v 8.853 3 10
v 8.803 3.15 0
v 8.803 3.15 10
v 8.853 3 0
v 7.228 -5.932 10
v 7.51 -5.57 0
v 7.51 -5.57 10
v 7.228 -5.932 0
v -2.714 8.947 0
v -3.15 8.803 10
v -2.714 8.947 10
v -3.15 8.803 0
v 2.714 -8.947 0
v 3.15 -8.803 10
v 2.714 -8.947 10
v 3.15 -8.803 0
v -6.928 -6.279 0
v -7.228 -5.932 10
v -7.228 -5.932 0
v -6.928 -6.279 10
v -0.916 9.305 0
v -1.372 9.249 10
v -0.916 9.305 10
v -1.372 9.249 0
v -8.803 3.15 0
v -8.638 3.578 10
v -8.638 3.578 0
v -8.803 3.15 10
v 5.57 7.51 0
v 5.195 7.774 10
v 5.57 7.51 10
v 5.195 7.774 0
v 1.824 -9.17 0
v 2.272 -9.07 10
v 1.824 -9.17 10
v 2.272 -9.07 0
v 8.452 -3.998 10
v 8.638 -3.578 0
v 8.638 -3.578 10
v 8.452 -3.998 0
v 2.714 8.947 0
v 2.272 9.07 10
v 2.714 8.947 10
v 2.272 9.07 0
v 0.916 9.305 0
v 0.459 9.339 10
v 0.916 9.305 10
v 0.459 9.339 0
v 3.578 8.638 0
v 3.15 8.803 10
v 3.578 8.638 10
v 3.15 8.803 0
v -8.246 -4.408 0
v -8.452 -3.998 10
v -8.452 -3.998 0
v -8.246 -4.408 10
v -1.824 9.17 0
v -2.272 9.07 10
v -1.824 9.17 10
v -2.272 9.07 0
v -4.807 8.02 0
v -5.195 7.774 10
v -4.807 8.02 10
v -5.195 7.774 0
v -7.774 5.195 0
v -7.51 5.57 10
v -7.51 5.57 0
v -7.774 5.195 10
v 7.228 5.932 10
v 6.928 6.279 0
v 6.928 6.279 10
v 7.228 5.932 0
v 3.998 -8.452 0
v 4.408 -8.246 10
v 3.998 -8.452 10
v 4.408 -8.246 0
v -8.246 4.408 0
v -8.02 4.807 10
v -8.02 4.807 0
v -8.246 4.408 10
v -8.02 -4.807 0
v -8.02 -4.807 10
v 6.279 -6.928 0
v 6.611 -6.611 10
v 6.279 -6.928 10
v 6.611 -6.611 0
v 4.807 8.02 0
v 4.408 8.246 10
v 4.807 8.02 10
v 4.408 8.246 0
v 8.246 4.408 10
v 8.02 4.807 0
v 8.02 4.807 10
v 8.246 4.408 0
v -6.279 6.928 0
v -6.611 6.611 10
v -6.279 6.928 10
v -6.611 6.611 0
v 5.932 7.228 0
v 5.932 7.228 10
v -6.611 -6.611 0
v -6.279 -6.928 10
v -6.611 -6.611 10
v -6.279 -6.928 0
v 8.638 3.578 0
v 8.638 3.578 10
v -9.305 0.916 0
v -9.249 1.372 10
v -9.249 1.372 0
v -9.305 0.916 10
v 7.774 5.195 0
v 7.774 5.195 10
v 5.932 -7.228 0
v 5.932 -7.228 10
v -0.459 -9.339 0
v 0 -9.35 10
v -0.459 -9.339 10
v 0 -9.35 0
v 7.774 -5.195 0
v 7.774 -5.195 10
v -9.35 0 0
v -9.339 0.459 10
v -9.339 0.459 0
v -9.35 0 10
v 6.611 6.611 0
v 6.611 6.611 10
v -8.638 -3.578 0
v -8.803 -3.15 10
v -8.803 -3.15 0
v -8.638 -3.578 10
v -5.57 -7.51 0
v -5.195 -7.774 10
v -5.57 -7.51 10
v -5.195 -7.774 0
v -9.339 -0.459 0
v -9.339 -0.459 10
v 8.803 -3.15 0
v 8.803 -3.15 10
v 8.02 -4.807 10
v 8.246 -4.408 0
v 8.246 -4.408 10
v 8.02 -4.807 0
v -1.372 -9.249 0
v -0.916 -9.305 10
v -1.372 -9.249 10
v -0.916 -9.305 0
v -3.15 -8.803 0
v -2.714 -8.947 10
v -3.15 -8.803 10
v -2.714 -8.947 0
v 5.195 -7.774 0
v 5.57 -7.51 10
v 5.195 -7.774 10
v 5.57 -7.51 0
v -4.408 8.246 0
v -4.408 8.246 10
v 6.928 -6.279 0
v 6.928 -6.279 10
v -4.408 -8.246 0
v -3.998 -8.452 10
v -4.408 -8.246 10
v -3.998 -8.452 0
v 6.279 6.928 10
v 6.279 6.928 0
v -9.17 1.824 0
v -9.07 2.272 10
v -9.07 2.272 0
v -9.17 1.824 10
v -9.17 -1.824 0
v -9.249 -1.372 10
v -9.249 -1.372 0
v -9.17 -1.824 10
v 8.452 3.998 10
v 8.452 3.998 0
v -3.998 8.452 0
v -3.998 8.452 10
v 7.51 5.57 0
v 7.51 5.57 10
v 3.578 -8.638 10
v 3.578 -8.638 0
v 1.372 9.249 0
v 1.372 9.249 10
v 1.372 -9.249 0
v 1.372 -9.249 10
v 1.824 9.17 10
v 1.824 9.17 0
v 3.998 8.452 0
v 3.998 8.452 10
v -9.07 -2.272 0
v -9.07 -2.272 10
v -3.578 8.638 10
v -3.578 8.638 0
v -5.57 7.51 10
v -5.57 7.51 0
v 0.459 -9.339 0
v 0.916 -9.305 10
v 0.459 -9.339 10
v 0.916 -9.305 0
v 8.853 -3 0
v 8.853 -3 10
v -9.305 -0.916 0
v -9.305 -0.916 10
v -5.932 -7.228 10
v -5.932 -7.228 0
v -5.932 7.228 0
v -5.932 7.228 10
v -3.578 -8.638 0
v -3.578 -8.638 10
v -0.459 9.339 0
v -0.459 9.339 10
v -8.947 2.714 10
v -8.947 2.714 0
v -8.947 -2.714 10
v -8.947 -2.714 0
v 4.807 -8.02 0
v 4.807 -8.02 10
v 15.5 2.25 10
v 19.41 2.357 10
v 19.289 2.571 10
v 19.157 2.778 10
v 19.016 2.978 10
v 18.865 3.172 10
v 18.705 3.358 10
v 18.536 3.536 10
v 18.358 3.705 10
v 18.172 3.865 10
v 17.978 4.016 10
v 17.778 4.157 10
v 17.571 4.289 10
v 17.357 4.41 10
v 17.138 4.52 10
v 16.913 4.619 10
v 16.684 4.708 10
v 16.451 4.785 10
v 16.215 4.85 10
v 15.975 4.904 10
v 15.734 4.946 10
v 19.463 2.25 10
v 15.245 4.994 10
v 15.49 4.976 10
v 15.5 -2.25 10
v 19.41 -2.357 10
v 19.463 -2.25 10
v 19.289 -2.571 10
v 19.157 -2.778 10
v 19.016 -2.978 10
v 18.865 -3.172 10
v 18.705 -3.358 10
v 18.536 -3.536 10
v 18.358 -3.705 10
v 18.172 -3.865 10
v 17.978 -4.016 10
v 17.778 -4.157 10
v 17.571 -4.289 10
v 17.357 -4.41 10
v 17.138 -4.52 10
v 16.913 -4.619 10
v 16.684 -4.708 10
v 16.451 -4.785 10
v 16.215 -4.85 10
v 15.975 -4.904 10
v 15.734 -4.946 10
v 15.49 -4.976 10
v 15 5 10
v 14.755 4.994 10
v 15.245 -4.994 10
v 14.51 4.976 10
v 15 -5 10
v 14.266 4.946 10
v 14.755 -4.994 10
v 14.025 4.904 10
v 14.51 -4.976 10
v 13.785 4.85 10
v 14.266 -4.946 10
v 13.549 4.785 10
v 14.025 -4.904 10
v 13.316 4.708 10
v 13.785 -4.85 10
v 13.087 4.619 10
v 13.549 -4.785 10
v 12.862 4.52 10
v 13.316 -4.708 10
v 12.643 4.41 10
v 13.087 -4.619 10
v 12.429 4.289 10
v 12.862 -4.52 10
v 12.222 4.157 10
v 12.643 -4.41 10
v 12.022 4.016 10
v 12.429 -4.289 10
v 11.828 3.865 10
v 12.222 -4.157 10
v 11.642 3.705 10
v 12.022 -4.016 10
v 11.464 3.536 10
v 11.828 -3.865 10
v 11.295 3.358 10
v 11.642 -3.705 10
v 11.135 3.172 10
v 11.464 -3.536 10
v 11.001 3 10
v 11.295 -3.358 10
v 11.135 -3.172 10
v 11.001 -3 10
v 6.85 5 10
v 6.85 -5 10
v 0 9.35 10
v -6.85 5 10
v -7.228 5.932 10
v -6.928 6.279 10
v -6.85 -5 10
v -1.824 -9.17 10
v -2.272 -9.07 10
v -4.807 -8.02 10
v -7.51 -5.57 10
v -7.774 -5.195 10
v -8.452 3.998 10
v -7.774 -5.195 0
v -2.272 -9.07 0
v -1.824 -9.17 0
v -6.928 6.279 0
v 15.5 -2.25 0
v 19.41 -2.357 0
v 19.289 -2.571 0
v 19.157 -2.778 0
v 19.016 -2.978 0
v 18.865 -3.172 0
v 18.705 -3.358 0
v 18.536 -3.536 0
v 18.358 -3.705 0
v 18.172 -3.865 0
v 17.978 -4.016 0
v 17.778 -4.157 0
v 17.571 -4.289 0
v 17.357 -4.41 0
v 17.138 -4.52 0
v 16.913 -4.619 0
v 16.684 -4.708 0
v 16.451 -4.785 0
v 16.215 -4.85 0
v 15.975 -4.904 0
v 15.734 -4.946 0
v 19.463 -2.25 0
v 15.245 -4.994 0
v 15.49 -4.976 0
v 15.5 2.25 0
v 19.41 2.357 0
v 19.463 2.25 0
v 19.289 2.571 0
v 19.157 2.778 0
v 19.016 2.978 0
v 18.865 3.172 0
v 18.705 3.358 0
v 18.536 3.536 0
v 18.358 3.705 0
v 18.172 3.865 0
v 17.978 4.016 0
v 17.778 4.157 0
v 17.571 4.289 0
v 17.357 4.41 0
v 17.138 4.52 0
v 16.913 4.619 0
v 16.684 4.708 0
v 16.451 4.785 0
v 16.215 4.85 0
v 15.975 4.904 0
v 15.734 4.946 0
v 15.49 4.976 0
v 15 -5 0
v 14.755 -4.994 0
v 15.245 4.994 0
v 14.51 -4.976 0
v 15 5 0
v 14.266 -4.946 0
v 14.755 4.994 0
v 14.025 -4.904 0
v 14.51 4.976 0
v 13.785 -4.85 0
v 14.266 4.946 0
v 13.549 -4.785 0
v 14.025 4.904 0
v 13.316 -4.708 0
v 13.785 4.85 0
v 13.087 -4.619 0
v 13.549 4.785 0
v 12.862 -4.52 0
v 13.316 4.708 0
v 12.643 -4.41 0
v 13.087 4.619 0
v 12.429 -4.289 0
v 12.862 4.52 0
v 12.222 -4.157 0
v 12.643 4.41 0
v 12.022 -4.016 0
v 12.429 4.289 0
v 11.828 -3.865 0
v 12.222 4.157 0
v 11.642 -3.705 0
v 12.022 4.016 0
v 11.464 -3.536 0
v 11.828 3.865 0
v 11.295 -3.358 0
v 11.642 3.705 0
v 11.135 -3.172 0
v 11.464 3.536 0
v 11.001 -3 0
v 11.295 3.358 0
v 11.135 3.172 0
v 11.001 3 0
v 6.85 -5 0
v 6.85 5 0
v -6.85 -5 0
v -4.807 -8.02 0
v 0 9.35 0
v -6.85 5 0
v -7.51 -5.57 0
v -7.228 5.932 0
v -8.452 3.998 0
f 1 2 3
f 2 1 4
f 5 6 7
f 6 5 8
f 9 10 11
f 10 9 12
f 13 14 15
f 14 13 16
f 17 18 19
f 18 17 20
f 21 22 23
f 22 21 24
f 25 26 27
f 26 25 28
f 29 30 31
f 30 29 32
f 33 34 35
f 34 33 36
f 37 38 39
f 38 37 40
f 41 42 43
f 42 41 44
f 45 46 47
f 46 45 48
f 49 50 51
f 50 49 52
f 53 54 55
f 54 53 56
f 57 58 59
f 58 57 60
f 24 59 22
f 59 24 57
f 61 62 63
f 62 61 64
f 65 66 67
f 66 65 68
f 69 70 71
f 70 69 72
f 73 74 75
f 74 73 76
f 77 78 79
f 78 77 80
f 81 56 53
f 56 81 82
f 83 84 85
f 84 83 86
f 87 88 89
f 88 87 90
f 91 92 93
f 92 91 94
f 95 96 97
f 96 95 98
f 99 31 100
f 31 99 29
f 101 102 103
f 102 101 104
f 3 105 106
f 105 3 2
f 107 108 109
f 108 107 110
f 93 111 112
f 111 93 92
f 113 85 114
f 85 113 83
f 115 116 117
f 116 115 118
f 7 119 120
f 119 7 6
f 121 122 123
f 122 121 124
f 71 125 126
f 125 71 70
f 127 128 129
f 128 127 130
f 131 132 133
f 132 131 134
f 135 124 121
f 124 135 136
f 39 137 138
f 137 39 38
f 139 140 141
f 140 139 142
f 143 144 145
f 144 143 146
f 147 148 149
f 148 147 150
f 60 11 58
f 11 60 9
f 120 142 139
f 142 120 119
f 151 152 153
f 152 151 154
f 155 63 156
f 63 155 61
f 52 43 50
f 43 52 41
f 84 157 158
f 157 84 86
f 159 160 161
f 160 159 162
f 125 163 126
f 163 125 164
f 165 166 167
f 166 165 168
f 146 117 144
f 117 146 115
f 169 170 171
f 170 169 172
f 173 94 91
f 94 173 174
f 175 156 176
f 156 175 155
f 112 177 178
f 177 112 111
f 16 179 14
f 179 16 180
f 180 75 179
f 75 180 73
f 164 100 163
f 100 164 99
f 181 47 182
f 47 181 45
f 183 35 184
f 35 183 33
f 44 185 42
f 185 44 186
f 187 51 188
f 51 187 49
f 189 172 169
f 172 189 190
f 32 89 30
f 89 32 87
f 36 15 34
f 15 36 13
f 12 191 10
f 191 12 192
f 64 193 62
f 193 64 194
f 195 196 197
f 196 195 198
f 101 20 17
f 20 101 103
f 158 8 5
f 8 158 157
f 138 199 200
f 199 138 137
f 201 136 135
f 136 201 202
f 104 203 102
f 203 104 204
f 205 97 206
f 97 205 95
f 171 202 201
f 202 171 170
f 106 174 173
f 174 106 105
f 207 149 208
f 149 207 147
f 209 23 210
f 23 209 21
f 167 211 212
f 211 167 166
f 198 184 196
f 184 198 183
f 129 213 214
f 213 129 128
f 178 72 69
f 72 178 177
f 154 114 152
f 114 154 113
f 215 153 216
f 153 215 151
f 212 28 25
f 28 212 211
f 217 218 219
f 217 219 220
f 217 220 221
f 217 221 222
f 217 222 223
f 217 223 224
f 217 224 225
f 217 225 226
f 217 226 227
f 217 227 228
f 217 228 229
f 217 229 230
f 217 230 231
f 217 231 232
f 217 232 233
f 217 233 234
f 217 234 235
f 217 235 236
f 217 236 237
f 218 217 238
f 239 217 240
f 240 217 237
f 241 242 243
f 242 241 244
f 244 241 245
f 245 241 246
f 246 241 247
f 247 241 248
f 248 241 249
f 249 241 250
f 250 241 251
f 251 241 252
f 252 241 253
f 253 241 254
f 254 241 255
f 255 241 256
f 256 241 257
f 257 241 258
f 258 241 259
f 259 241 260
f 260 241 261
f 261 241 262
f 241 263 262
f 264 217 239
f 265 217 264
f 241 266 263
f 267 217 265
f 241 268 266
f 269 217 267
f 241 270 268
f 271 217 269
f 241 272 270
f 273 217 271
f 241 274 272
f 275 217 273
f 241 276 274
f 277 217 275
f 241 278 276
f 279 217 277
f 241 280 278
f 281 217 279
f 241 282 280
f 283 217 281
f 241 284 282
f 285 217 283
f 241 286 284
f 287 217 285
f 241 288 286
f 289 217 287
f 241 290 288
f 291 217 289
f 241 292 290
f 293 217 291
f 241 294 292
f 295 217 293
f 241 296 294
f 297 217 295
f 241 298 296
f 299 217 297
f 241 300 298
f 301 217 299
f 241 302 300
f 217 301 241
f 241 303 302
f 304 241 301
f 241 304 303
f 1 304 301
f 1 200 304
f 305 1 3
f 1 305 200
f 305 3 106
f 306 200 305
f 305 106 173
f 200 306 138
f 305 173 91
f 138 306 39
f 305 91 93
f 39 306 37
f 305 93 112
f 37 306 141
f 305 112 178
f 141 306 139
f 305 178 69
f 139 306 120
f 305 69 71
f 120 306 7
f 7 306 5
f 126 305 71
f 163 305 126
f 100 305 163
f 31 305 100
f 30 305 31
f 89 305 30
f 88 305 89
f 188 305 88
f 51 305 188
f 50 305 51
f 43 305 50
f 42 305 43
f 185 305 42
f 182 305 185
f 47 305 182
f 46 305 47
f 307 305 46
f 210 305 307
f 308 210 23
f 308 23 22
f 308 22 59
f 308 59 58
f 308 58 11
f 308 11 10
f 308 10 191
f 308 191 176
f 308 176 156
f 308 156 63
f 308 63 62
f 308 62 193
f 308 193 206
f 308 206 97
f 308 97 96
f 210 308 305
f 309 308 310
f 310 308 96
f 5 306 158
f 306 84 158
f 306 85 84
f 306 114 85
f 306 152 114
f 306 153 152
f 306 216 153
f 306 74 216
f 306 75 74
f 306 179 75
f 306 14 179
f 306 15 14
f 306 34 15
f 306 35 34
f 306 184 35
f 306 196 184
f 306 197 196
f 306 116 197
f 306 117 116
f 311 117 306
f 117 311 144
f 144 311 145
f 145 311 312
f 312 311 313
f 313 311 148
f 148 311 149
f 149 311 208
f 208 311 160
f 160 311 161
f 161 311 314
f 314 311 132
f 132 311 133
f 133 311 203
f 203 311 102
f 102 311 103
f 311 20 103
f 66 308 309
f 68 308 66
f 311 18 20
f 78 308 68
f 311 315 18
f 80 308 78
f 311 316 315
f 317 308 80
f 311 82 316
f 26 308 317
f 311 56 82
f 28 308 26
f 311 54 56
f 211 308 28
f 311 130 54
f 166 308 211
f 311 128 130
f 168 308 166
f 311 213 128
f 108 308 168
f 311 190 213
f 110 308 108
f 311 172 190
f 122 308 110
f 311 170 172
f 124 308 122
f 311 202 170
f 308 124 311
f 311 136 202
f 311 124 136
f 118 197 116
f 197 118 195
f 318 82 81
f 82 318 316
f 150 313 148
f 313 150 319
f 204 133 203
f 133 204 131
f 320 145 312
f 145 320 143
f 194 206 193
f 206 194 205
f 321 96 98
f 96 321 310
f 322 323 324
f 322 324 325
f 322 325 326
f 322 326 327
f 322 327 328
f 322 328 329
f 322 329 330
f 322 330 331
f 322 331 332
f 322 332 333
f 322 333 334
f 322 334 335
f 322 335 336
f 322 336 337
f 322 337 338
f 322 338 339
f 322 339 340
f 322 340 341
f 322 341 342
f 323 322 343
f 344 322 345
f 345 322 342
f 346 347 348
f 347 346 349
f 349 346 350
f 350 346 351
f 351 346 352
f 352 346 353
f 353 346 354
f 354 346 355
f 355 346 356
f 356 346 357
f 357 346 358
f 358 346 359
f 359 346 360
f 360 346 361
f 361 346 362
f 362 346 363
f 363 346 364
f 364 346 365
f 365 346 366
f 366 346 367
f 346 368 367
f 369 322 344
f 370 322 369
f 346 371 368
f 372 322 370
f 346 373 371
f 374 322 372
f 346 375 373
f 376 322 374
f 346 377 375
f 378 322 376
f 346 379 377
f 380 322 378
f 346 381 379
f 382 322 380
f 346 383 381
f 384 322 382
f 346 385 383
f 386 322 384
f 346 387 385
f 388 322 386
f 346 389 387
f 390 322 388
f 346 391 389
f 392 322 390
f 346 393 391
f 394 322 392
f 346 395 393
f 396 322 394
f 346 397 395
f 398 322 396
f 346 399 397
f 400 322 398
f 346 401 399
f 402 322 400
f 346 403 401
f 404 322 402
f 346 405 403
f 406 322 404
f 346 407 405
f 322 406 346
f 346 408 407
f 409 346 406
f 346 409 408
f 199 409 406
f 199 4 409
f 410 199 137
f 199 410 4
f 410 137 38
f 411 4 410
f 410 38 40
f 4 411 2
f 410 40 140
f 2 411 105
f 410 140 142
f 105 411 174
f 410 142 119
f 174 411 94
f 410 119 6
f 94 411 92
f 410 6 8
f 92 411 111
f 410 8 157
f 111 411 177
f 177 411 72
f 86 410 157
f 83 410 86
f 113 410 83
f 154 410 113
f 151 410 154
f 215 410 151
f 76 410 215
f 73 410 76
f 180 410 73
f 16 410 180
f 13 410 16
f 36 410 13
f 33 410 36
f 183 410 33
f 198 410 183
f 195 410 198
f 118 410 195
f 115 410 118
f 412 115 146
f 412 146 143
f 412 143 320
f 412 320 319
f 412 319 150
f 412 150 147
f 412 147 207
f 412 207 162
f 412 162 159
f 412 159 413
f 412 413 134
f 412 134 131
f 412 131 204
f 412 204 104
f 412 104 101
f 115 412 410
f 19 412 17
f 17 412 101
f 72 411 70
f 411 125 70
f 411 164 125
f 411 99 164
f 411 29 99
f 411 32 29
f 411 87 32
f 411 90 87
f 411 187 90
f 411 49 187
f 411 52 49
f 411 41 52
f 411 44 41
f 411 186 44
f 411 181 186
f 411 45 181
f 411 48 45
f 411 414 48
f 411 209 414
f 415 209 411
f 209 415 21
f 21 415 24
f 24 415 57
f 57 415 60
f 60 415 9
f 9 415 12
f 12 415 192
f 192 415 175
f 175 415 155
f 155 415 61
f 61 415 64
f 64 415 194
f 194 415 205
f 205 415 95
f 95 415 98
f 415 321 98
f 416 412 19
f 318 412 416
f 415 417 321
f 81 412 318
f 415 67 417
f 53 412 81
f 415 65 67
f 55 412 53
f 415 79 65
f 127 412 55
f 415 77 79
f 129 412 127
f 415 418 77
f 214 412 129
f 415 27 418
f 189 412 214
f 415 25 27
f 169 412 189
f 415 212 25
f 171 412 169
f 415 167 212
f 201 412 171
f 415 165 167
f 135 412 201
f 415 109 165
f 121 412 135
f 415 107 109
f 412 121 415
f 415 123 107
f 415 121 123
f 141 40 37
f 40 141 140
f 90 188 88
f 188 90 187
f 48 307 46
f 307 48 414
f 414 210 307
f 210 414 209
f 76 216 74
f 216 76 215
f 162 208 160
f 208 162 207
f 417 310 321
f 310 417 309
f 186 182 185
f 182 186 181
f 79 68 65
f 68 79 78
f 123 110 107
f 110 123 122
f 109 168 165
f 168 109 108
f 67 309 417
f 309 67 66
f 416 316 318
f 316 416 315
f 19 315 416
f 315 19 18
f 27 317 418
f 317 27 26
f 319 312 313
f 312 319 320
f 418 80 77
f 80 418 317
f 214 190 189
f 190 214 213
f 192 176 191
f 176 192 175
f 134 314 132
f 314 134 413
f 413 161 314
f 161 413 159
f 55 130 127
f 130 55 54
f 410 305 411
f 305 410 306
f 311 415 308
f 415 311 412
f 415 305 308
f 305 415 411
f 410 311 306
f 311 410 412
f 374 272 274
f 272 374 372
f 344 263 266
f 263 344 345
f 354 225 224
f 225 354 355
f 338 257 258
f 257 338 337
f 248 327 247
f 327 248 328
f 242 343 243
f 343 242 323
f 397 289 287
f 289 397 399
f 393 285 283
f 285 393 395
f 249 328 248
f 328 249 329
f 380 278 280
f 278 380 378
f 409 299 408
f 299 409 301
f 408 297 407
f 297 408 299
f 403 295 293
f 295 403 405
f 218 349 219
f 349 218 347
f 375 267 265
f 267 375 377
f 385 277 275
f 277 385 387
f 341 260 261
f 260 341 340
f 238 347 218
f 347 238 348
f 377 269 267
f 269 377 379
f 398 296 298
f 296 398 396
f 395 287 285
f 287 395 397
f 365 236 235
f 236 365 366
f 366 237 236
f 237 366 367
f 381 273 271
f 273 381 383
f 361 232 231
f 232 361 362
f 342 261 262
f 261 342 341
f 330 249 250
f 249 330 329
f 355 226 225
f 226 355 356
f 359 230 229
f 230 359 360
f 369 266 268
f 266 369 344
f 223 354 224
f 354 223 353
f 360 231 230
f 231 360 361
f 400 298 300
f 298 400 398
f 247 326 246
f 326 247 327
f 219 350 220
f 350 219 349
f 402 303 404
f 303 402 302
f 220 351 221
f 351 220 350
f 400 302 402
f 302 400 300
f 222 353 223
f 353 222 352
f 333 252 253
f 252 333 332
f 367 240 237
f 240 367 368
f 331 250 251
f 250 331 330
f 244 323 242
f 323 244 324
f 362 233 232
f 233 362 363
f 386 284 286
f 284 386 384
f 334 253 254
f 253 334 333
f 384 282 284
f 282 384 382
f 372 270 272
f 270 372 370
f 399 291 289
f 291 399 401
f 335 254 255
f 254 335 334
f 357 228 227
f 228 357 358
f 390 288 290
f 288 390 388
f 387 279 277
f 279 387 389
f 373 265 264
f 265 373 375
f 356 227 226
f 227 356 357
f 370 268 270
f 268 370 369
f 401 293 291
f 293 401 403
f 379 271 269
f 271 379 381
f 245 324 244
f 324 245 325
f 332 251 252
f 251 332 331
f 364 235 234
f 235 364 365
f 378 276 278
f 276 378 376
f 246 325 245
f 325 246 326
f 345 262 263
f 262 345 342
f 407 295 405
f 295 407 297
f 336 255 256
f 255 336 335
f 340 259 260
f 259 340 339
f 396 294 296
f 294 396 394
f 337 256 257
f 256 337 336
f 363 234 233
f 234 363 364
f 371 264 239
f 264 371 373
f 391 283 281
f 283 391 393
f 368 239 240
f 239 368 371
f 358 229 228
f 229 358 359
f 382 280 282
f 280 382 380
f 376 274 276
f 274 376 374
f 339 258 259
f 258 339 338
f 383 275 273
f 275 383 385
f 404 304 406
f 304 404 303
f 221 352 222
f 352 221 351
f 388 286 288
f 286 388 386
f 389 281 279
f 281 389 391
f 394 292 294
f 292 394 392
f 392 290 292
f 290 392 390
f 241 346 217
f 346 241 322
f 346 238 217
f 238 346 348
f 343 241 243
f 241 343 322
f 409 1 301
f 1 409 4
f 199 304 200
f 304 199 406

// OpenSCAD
// Snap-on clip: holds a piece of tubing next to a 12.7 mm (1/2") lab stand rod
// Printed flat: 10 mm tall extrusion (Z) of a 2-D profile in XY.

$fn = 128;

// ---------------- Parameters ----------------
rod_d      = 12.7;              // rod ring inner diameter
rod_wall   = 3;                 // rod ring wall thickness
rod_od     = rod_d + 2*rod_wall; // rod ring outer diameter (18.7)

tub_d      = 6;                 // tubing ring inner diameter
tub_wall   = 2;                 // tubing ring wall thickness
tub_od     = tub_d + 2*tub_wall; // tubing ring outer diameter (10)

bridge_w   = 6;                 // bridge width in X (from x = 8 to x = 12)
bridge_y   = 6;                 // bridge width in Y

clip_h     = 10;                // extrusion height (Z)

// Opening half-widths (y from centre line)
rod_open_h = 5;                 // rod opening: -5 < y < 5
tub_open_h = 2.25;              // tubing opening: -2.25 < y < 2.25

eps        = 0.5;               // cutter overshoot past cut faces

// ---------------- Derived ----------------
rod_r_out  = rod_od / 2;
rod_r_in   = rod_d / 2;
tub_r_out  = tub_od / 2;
tub_r_in   = tub_d / 2;

// ---------------- Model ----------------
difference() {
    union() {
        // Rod ring
        difference() {
            cylinder(d = rod_od, h = clip_h);
            // hole for rod (x < 0, -rod_open_h < y < rod_open_h)
            translate([-(rod_r_in + eps), -rod_open_h])
                cube([rod_d + 2*eps, 2*rod_open_h, clip_h]);
        }

        // Tubing ring, centre at x = 15
        translate([15, 0, 0])
            difference() {
                cylinder(d = tub_od, h = clip_h);
                translate([eps, -tub_open_h])
                    cube([tub_d + 2*eps, 2*tub_open_h, clip_h]);
            }

        // Solid bridge between x = 8 and x = 12
        translate([8, -bridge_y / 2, 0])
            cube([bridge_w, bridge_y, clip_h]);
    }
}
